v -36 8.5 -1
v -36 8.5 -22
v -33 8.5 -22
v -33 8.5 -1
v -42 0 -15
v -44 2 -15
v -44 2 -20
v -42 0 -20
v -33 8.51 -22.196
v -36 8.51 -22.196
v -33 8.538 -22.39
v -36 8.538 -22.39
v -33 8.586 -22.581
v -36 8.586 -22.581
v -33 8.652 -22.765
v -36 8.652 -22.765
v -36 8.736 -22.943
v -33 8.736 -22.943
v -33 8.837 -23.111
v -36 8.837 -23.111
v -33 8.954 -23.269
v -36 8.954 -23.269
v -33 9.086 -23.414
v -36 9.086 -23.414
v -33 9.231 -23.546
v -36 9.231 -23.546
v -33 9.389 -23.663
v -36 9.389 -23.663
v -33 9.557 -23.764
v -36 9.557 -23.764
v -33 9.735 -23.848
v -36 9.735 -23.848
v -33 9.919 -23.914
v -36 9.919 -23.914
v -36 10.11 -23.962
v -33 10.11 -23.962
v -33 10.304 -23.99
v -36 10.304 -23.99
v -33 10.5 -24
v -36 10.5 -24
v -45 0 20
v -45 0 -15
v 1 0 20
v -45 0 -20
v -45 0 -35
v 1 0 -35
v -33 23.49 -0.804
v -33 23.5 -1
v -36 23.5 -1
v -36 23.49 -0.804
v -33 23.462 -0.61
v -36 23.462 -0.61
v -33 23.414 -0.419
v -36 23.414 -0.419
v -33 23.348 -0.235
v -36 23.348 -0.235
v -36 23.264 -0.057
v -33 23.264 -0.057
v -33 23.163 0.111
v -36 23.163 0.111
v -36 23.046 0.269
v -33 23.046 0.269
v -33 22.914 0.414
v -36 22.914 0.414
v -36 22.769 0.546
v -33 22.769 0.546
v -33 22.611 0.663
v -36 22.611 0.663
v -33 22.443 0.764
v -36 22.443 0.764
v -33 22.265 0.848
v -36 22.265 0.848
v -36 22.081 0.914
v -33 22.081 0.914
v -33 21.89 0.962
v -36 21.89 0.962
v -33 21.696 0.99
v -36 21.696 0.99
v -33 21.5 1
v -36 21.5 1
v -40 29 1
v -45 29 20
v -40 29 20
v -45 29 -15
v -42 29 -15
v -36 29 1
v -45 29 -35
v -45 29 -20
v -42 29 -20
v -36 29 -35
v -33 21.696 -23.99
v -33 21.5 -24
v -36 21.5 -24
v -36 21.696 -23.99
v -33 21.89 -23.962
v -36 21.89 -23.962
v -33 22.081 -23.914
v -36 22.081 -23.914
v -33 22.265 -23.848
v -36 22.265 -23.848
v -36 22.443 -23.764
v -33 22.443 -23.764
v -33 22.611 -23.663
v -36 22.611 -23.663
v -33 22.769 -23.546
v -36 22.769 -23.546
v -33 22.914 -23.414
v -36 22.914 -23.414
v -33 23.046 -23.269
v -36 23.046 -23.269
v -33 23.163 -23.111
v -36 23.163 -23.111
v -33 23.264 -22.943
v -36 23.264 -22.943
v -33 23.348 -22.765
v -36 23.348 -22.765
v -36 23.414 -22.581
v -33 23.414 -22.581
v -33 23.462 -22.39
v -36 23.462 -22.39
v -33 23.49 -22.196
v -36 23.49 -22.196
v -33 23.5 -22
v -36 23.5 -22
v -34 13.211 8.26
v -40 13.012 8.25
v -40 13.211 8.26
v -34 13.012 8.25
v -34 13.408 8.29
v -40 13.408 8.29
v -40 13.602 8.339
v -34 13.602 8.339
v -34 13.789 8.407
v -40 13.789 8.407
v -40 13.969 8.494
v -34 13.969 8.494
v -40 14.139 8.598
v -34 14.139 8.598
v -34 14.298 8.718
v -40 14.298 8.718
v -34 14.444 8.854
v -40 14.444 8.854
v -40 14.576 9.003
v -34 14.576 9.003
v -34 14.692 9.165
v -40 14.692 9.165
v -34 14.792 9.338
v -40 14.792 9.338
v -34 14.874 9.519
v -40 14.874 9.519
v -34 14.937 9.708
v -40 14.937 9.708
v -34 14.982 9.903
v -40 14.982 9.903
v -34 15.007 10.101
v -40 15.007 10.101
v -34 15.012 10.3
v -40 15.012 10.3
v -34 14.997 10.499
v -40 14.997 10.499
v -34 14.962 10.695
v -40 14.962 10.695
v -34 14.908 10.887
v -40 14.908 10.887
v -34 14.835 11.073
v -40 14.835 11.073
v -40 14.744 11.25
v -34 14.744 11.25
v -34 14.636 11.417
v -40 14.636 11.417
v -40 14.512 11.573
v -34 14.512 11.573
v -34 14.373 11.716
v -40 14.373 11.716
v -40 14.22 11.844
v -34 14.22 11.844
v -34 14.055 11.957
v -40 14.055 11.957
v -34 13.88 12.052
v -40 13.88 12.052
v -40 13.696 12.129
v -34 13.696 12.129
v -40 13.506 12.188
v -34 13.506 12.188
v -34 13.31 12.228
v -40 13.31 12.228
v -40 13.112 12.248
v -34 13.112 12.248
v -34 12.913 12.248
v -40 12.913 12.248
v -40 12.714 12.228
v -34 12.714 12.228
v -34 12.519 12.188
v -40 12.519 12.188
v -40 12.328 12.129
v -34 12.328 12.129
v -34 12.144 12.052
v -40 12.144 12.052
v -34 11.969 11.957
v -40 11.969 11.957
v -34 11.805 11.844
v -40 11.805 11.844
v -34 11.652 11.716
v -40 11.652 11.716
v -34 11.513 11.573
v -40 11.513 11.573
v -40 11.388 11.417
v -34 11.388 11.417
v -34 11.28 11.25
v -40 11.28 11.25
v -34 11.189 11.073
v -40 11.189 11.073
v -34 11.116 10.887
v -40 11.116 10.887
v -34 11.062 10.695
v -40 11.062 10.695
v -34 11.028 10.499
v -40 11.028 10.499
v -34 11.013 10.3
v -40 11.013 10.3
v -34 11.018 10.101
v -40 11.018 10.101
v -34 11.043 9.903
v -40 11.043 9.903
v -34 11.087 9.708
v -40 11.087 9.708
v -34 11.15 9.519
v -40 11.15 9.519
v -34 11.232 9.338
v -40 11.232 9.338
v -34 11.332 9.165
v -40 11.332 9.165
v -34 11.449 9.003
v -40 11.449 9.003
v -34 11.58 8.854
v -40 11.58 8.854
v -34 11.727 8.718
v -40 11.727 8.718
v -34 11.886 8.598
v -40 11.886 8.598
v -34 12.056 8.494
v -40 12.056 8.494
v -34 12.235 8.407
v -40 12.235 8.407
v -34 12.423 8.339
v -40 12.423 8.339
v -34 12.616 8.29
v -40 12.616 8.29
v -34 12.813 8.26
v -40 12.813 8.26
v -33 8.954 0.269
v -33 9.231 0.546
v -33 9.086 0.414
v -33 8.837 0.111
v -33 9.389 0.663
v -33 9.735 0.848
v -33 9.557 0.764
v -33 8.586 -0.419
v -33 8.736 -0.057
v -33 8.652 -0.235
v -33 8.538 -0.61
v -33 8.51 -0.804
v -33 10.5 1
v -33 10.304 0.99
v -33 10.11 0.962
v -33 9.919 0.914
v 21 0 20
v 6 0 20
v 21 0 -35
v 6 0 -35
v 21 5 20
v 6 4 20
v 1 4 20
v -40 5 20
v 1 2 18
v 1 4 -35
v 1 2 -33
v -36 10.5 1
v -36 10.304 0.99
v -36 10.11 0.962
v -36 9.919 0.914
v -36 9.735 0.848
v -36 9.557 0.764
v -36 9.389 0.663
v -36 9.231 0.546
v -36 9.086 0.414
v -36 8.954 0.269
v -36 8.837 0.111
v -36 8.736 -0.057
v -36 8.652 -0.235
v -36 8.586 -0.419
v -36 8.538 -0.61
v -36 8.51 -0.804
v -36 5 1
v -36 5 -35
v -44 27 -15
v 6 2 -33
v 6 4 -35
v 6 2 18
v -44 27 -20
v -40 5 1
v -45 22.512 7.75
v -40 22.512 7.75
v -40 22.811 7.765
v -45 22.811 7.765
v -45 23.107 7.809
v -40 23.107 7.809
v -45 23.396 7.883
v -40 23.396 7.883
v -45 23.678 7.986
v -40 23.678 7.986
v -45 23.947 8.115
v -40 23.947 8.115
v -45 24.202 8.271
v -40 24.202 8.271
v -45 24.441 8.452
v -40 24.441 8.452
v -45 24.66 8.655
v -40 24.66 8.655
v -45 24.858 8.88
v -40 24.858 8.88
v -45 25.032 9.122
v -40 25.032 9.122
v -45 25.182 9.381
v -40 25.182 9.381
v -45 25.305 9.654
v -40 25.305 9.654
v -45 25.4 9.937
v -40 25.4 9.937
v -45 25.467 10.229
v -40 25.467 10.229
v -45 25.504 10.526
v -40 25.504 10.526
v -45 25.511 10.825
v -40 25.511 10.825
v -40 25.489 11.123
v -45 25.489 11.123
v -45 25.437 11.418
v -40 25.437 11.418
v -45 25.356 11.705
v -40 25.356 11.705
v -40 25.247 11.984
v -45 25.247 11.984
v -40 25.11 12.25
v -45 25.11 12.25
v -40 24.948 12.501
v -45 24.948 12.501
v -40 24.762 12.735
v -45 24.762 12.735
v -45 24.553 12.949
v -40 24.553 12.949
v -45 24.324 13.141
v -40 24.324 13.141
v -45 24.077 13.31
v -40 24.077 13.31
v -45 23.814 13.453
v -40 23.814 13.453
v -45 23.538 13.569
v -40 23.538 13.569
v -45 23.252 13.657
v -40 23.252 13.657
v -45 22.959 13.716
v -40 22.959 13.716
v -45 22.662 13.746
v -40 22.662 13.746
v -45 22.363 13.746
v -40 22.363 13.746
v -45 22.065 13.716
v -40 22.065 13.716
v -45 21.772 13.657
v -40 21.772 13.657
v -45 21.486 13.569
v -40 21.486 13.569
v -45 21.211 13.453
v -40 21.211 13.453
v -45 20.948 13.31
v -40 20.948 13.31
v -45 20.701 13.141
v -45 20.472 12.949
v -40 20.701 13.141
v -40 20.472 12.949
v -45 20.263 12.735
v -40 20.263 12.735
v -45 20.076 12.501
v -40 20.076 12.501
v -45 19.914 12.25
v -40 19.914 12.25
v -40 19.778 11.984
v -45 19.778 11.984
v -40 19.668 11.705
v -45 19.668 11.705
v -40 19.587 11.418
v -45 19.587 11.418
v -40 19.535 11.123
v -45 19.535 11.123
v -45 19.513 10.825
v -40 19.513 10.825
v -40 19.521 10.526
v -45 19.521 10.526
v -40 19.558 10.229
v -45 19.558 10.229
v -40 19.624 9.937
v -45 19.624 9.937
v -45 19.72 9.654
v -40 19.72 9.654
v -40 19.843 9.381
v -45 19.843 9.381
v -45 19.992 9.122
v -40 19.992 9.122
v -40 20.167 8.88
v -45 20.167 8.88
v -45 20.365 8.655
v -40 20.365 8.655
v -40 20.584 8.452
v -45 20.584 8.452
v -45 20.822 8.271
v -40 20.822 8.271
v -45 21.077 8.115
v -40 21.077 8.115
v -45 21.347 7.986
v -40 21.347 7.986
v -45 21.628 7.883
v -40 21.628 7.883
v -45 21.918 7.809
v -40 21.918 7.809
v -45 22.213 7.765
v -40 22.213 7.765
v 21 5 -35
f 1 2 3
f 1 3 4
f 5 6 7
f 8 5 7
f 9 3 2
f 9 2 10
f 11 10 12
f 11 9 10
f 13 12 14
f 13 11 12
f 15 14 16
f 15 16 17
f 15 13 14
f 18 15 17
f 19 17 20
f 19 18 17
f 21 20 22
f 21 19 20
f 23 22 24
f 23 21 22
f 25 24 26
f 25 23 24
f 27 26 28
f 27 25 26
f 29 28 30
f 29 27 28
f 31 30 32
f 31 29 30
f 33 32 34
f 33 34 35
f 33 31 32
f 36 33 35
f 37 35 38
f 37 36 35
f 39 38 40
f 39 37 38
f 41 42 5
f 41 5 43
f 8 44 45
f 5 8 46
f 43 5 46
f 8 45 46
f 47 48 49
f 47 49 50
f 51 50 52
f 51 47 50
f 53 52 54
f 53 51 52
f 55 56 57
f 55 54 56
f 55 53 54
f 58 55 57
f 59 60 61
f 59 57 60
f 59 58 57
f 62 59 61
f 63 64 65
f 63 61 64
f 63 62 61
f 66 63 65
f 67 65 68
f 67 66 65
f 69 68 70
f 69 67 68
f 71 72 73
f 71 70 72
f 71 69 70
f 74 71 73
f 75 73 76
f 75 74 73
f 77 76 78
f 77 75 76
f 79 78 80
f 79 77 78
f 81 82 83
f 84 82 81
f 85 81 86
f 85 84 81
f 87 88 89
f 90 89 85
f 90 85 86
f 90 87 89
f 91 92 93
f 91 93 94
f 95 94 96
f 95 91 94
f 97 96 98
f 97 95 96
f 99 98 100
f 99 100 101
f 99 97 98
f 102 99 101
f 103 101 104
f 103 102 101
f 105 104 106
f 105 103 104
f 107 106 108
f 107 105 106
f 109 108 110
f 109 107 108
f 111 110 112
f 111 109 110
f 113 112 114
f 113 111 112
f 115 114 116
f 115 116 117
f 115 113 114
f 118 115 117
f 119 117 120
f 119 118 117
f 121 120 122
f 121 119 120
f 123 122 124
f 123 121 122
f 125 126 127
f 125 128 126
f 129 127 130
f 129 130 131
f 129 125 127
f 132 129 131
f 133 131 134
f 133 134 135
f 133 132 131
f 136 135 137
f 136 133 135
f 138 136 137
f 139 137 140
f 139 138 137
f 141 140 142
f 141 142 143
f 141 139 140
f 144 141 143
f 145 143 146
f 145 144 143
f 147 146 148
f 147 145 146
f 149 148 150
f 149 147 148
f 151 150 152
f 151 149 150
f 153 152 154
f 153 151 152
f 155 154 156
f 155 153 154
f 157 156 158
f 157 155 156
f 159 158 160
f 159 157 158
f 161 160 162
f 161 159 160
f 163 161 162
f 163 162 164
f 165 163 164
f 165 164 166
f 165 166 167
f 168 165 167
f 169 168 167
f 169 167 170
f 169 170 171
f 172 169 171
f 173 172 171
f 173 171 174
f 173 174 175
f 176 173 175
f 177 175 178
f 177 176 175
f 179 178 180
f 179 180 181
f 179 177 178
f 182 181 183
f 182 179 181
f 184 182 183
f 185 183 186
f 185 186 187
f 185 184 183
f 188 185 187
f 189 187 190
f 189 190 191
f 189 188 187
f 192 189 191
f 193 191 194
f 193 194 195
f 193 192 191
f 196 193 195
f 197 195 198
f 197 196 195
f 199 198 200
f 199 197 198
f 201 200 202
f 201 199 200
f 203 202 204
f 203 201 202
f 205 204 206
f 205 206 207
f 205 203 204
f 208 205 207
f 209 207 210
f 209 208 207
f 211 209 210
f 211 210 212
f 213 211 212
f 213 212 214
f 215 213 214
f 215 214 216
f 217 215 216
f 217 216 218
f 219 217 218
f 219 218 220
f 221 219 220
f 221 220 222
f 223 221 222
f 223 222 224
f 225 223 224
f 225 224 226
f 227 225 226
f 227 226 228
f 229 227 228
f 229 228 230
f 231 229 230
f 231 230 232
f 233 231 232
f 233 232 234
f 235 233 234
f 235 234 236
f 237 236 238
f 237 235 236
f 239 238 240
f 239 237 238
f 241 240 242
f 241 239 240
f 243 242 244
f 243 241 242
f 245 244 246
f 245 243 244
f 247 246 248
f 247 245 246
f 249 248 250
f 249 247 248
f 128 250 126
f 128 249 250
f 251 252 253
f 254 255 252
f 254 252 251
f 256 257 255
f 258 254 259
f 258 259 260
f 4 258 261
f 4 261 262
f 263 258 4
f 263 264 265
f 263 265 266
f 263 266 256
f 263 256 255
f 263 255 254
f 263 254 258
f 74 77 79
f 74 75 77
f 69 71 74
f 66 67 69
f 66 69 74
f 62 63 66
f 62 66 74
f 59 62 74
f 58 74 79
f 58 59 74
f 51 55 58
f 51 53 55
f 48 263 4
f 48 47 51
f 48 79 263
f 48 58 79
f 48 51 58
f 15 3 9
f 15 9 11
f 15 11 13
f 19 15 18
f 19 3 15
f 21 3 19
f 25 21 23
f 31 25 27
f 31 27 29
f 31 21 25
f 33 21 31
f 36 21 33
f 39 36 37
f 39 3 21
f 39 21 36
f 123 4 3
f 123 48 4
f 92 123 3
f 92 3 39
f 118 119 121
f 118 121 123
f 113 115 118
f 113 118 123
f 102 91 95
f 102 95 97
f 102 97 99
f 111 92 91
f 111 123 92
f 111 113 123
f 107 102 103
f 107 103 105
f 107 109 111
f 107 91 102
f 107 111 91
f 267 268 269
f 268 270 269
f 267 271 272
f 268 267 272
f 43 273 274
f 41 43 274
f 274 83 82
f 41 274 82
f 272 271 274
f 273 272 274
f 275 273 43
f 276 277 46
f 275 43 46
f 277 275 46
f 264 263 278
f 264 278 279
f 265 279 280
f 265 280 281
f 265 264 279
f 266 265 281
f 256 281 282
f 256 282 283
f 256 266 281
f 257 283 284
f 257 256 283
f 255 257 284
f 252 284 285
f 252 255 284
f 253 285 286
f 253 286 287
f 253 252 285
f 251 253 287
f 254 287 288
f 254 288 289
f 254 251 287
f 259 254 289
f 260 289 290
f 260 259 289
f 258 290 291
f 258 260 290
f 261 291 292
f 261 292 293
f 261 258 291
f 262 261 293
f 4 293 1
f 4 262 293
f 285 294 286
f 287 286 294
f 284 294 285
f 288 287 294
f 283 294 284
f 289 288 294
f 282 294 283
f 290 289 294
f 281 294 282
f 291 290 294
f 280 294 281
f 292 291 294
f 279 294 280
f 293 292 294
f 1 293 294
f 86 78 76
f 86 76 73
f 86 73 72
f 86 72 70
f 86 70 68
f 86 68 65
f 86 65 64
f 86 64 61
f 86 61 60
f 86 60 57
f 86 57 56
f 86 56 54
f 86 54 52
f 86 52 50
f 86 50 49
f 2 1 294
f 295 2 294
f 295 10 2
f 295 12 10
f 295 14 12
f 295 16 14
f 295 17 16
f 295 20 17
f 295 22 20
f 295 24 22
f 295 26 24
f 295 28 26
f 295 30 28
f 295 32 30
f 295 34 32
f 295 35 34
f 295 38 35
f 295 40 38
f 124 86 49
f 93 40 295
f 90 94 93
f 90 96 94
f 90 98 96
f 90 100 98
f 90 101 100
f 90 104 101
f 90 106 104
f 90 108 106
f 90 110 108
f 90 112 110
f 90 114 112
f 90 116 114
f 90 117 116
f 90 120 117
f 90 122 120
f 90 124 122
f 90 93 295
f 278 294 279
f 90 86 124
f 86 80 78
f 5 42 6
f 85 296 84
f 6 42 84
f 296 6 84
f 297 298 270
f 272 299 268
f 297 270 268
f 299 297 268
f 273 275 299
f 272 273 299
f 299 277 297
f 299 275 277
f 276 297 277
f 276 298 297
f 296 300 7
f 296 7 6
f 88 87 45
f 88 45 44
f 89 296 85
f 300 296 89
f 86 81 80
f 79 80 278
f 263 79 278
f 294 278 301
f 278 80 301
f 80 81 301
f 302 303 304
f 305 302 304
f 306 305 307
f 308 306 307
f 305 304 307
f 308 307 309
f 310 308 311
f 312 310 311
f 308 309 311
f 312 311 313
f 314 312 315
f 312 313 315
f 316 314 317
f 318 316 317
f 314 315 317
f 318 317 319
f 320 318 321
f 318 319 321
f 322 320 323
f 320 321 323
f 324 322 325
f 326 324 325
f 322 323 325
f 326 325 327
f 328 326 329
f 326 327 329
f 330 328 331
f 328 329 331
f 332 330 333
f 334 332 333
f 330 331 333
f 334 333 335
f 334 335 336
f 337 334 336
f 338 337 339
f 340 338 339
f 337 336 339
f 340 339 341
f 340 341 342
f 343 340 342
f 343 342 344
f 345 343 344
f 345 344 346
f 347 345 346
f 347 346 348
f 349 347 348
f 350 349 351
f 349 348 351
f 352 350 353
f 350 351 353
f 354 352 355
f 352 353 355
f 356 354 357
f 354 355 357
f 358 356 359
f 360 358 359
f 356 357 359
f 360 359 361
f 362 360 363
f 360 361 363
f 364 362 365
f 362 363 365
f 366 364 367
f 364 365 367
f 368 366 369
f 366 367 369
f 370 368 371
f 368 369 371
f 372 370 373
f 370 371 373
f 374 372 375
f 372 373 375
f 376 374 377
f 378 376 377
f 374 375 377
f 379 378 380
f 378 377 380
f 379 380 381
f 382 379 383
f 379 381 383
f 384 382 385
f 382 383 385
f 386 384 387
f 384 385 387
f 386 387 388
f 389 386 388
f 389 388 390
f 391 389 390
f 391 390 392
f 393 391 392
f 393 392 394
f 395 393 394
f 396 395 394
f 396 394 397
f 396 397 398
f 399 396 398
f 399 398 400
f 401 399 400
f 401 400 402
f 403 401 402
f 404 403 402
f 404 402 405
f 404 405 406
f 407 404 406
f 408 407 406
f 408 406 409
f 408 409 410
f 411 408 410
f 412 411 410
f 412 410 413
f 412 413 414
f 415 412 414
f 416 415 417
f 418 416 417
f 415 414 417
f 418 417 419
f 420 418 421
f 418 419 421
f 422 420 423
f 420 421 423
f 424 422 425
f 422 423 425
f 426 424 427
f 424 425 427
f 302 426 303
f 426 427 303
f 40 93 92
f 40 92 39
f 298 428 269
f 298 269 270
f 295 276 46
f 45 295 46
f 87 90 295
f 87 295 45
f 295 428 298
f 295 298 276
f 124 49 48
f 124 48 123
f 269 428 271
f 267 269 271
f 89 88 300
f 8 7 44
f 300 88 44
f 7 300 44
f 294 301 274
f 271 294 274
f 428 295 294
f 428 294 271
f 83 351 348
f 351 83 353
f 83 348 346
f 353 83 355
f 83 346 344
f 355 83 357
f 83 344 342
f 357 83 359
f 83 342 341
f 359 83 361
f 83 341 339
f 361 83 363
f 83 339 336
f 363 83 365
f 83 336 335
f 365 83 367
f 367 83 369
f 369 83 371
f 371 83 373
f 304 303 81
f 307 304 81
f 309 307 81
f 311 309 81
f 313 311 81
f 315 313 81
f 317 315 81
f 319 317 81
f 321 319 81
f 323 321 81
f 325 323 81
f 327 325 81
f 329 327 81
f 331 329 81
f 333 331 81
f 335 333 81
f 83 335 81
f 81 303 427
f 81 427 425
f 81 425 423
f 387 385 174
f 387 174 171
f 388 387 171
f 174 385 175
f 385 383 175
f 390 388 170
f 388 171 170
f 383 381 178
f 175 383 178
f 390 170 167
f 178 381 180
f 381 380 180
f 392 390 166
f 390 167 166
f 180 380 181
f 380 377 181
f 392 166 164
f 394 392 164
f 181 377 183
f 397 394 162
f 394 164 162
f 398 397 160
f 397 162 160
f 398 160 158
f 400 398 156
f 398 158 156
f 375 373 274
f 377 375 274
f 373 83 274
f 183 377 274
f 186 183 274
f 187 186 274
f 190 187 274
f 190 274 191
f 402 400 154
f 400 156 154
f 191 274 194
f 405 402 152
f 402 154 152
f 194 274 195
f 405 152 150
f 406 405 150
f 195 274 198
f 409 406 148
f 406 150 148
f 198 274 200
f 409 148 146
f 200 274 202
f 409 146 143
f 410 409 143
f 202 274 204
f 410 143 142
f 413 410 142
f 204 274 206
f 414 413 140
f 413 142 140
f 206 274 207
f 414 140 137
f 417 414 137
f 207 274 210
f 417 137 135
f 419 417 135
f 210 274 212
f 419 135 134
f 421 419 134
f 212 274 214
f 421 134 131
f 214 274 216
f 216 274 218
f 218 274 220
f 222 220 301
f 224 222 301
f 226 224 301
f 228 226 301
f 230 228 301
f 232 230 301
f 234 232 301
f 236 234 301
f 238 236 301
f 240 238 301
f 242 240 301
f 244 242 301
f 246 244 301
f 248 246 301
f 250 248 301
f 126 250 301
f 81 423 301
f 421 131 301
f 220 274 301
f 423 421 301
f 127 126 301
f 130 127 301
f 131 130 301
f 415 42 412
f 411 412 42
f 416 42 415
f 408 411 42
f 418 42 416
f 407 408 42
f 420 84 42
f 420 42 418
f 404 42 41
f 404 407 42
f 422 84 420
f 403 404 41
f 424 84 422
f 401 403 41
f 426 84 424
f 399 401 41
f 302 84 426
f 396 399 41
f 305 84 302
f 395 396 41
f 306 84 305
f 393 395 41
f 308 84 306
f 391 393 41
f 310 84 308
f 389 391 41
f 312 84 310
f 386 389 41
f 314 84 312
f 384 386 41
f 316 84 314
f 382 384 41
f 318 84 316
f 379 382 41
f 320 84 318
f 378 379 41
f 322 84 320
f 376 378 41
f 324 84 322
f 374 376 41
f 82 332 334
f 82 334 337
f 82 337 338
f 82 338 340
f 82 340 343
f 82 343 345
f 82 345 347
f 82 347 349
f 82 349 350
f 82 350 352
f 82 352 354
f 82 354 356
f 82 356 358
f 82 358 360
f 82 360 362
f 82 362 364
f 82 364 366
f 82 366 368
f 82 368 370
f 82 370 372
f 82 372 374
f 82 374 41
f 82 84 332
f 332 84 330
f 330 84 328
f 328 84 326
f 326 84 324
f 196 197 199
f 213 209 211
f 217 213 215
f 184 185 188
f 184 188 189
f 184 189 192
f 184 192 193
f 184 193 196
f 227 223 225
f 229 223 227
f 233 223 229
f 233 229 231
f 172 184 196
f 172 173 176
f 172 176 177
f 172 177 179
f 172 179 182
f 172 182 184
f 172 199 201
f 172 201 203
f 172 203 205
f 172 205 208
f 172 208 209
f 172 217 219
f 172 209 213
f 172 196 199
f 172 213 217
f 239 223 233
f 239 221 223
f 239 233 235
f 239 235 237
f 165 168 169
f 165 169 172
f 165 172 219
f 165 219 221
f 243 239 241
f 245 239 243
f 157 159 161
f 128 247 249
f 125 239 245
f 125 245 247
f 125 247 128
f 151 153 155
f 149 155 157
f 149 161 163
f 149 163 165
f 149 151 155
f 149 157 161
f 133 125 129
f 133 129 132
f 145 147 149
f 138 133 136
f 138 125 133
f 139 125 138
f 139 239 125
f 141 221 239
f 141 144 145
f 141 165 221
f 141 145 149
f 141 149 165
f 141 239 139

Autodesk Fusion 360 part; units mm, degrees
sketch "Sketch1" plane through (0, 0, 0) normal (0, 1, 0) x (1, 0, 0)
  line L0 (-40, 35) -> (31, 35)
  line L1 (31, 35) -> (31, -20)
  line L2 (31, -20) -> (-40, -20)
  line L3 (-40, -20) -> (-40, 35)
  line L4 (-40, 35) -> (-45, 35)
  line L5 (-45, 35) -> (-45, -20)
  line L6 (-45, -20) -> (-40, -20)
  line L7 (-40, -20) -> (-40, 35)
  dimension "d1" = 71
  dimension "d2" = 55
extrude "Extrude1" add sketch "Sketch1" along normal blind 3 contours L0 L1 L2 L3 L7 makes body 1
extrude "Extrude2" add sketch "Sketch1" along normal blind 3 contours L3 L4 L5 L6 L7 bodies 1
extrude "Extrude3" add sketch "Sketch1" along normal blind 29 separate body contours L3 L4 L5 L6 L7 makes body 2
sketch "Sketch2" plane through (-40, 0, 0) normal (1, 0, 0) x (0, 0, -1)
  line L0 (-20, 0) -> (35, 0)
  line L1 (35, 0) -> (35, 29)
  line L2 (35, 29) -> (-20, 29)
  line L3 (-20, 29) -> (-20, 0)
  line L4 (35, 29) -> (-1, 29)
  line L5 (-1, 29) -> (-1, 3)
  line L6 (-1, 3) -> (35, 3)
  line L7 (35, 3) -> (35, 29)
  line L8 (-20, 3) -> (35, 3)
  dimension "d9" = 36
extrude "Extrude4" add sketch "Sketch2" along normal blind 4 contours L1 L2 L4 L5 L6 L7 L8 bodies 1 2
sketch "Sketch3" plane through (-36, 0, 0) normal (1, 0, 0) x (0, 0, -1)
  line L0 (-1, 29) -> (-1, 3)
  line L1 (-1, 3) -> (35, 3)
  line L2 (35, 3) -> (35, 29)
  line L3 (35, 29) -> (-1, 29)
  line L4 (20.1451, 29) -> (20.1451, 23.5)
  line L5 (-1, 23.5) -> (24, 23.5)
  line L6 (24, 23.5) -> (24, 8.5)
  line L7 (24, 8.5) -> (-1, 8.5)
  line L8 (-1, 8.5) -> (-1, 23.5)
  dimension "d12" = 5.5
  dimension "d13" = 25
  dimension "d14" = 15
extrude "Extrude5" add sketch "Sketch3" along normal blind 3 contours L0 L5 L6 L7 L8 bodies 1
fillet "Fillet1" radius 2 4 edges at (-34.5, 23.5, 1) (-34.5, 8.5, 1) (-34.5, 23.5, -24) (-34.5, 8.5, -24) on bodies 1
sketch "Sketch4" plane through (-40, 0, 0) normal (1, 0, 0) x (0, 0, -1)
  line L0 (-20, 3) -> (-1, 3)
  line L1 (-1, 3) -> (-1, 29)
  line L2 (-1, 29) -> (-20, 29)
  line L3 (-20, 29) -> (-20, 3)
  line L4 (-11.8235, 29) -> (-11.8235, 22.5)
  line L5 (-20, 22.5122) -> (-10.75, 22.5122)
  dimension "d18" = 6.5
  dimension "d19" = 9.25
sketch "Sketch5" plane through (-45, 0, 0) normal (-1, 0, 0) x (0, 0, 1)
  line L0 (-35, 0) -> (20, 0)
  line L1 (20, 0) -> (20, 29)
  line L2 (20, 29) -> (-35, 29)
  line L3 (-35, 29) -> (-35, 0)
  line L4 (8.25, 22.5122) -> (8.25, 13.0122)
  line L5 (8.25, 13.0122) -> (10.25, 13.0122)
  dimension "d22" = 9.5
  dimension "d23" = 2
cylinder "CylinderPrimitive2" add diameter 4 height 6 placed x (0, 0, -1) y (0, 1, 0) z (1, 0, 0) at (-40, 13.0122, 10.25) bodies 1
extrude "Extrude6" add 1 faces at (8.6667, 3, -4.6667) along direction (0, 1, 0) blind 2 on bodies 1 bodies 1
extrude "Extrude7" cut 1 faces at (5.6667, 0, 1.6667) along direction (0, 1, 0) blind 2 on bodies 1 bodies 1
cylinder "CylinderPrimitive3" cut diameter 6 height -6 placed x (0, 0, -1) y (0, 1, 0) z (1, 0, 0) at (-40, 22.5122, 10.75) bodies 1
extrude "Extrude8" add 1 faces at (5.6667, 2, 1.6667) along direction (0, -1, 0) blind 2 on bodies 1 bodies 1
sketch "Sketch8" plane through (0, 0, 0) normal (0, -1, 0) x (1, 0, 0)
  line L0 (-45, -35) -> (31, -35)
  line L1 (31, -35) -> (31, 20)
  line L2 (31, 20) -> (-45, 20)
  line L3 (-45, 20) -> (-45, -35)
  line L4 (31, 20) -> (6, 20)
  line L5 (6, 20) -> (1, 20)
  line L6 (1, 20) -> (1, -35)
  line L7 (1, -35) -> (6, -35)
  line L8 (6, -35) -> (6, 20)
  dimension "d34" = 25
  dimension "d35" = 5
extrude "Extrude9" cut sketch "Sketch8" against normal blind 2 contours L0 L2 L5 L6 L7 L8 bodies 1
chamfer "Chamfer1" distance 2 angle 45 2 edges at (3.5, 2, 20) (3.5, 2, -35) on bodies 1
extrude "Extrude10" cut 1 faces at (31, 3.3333, -16.6667) along direction (-1, 0, 0) blind 10 on bodies 1 bodies 1
sketch "Sketch9" plane through (-45, 0, 0) normal (-1, 0, 0) x (0, 0, 1)
  circle A0 centre (10.75, 22.5122) radius 3
  line L0 (20, 0) -> (20, 29)
  line L1 (20, 29) -> (-35, 29)
  line L2 (-35, 29) -> (-35, 0)
  line L3 (-35, 0) -> (20, 0)
  line L4 (-20, 29) -> (-15, 29)
  line L5 (-15, 29) -> (-20, 29)
  line L6 (-20, 29) -> (-20, 0)
  line L7 (-20, 0) -> (-15, 0)
  line L8 (-15, 0) -> (-15, 29)
  dimension "d41" = 20
extrude "Extrude11" cut sketch "Sketch9" against normal blind 1 contours L1 L3 L4 L5 L6 L7 L8 bodies 1
chamfer "Chamfer2" distance 2 angle 45 2 edges at (-44, 29, -17.5) (-44, 0, -17.5) on bodies 1
